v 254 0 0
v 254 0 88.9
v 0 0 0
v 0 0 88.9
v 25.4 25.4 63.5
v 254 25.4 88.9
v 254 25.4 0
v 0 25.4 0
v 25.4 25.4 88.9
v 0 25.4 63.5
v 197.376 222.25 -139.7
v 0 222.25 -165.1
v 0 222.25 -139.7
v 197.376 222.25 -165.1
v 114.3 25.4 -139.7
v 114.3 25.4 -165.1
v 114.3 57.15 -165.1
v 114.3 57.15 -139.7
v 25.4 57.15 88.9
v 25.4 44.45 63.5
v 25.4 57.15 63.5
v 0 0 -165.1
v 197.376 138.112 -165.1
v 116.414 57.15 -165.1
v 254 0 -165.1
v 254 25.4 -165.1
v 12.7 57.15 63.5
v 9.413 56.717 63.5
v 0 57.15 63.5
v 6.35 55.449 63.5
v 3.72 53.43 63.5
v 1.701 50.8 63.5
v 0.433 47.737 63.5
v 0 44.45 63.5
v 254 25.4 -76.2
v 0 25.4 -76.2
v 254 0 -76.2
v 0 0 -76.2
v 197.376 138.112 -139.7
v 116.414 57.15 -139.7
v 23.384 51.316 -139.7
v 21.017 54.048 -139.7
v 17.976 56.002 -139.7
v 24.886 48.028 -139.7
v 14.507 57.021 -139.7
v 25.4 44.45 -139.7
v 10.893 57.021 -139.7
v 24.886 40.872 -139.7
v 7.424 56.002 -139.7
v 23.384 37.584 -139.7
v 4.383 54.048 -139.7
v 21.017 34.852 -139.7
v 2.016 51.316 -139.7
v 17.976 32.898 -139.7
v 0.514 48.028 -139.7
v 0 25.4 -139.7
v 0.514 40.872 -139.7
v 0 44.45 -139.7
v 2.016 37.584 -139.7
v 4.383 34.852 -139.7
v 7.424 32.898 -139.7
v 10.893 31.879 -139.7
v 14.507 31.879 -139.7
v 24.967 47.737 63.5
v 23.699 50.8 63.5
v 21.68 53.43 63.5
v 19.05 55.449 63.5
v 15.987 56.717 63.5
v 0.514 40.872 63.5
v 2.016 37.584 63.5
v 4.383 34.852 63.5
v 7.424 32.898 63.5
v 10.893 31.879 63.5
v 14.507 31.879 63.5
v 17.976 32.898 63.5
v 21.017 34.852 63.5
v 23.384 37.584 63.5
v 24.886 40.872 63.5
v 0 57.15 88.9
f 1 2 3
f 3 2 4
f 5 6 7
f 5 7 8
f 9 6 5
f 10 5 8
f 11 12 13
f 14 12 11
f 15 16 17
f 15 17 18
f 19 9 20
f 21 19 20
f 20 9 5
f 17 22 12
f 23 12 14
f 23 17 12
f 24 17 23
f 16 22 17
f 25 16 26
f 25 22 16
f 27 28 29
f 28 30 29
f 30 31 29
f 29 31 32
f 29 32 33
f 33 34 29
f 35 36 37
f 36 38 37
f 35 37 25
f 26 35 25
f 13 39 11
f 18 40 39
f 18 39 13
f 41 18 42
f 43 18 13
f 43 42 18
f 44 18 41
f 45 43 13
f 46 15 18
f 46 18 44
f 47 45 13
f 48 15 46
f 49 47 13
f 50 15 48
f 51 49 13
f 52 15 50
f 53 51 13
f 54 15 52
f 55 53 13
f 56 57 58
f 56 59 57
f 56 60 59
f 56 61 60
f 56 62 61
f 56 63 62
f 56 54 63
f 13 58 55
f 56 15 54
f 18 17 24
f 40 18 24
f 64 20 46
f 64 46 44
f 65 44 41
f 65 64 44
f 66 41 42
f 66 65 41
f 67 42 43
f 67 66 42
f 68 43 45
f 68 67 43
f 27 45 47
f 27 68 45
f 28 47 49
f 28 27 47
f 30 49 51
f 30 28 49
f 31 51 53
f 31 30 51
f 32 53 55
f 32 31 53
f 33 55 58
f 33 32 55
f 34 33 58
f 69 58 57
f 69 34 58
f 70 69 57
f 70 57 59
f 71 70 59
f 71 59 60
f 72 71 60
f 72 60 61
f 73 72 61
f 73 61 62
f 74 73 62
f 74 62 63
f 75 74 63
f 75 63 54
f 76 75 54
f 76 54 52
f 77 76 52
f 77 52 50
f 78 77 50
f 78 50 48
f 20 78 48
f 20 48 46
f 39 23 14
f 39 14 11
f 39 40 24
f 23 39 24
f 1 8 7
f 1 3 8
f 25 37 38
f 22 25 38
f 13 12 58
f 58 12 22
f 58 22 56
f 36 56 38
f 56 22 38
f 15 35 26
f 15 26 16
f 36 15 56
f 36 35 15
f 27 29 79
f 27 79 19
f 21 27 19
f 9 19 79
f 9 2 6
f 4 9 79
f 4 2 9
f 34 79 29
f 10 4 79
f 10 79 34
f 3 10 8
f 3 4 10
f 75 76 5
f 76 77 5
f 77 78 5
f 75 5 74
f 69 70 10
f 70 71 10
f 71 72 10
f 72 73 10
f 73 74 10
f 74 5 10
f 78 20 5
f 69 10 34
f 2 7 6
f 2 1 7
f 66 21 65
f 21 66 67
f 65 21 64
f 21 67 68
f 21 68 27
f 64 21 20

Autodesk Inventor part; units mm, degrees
ref_plane "YZ Plane" through (0, 0, 0) normal (1, 0, 0) x (0, 1, 0)
ref_plane "XZ Plane" through (0, 0, 0) normal (0, 1, 0) x (-1, 0, 0)
ref_plane "XY Plane" through (0, 0, 0) normal (0, 0, 1) x (1, 0, 0)
sketch "Sketch1" plane through (0, 0, 0) normal (0, 1, 0) x (-1, 0, 0)
  line L0 (0, 0) -> (-254, 0)
  line L1 (-254, 0) -> (-254, 88.9)
  line L2 (-254, 88.9) -> (0, 88.9)
  line L3 (0, 88.9) -> (0, 0)
  line L4 (0, -76.2) -> (-254, -76.2)
  line L5 (-254, -76.2) -> (-254, -165.1)
  line L6 (-254, -165.1) -> (0, -165.1)
  line L7 (0, -165.1) -> (0, -76.2)
  dimension "d0" = 88.9
  dimension "d1" = 254
  dimension "d2" = 254
  dimension "d3" = 88.9
  dimension "d4" = 76.2
extrude "Extrusion1" add sketch "Sketch1" along normal blind 25.4
sketch "Sketch2" plane through (0, 25.4, 0) normal (0, 1, 0) x (1, 0, 0)
  line L0 (0, -88.9) -> (25.4, -88.9)
  line L1 (25.4, -88.9) -> (25.4, -63.5)
  line L2 (25.4, -63.5) -> (0, -63.5)
  line L3 (0, -63.5) -> (0, -88.9)
  line L4 (0, 165.1) -> (114.3, 165.1)
  line L5 (114.3, 165.1) -> (114.3, 139.7)
  line L6 (114.3, 139.7) -> (0, 139.7)
  line L7 (0, 139.7) -> (0, 165.1)
  point P0 (25.4, 139.7)
  dimension "d7" = 25.4
  dimension "d17" = 114.3
  dimension "d18" = 25.4
extrude "Extrusion2" add sketch "Sketch2" along normal blind 31.75
sketch "Sketch3" plane through (0, 0, 88.9) normal (0, 0, 1) x (1, 0, 0)
  circle A0 centre (12.7, 44.45) radius 12.7
  line L0 (25.4, 57.15) -> (0, 57.15) projected
  point P0 (0, 0)
  dimension "d13" = 12.7
  dimension "d14" = 25.4
extrude "Extrusion3" add sketch "Sketch3" against normal blind 242.8875
sketch "Sketch4" plane through (0, 57.15, 0) normal (0, 1, 0) x (1, 0, 0)
  line L0 (0, 165.1) -> (0, 76.2) projected
  line L1 (0, 165.1) -> (197.3764, 165.1)
  line L2 (197.3764, 165.1) -> (197.3764, 139.7)
  line L3 (197.3764, 139.7) -> (0, 139.7)
  line L4 (0, 139.7) -> (0, 165.1)
  point P0 (0, 0)
extrude "Extrusion4" add sketch "Sketch4" along normal blind 165.1
chamfer "Chamfer1" distance 80.9625 angle 45 1 edges at (197.3764, 57.15, -152.4)
properties part number "handbase"
